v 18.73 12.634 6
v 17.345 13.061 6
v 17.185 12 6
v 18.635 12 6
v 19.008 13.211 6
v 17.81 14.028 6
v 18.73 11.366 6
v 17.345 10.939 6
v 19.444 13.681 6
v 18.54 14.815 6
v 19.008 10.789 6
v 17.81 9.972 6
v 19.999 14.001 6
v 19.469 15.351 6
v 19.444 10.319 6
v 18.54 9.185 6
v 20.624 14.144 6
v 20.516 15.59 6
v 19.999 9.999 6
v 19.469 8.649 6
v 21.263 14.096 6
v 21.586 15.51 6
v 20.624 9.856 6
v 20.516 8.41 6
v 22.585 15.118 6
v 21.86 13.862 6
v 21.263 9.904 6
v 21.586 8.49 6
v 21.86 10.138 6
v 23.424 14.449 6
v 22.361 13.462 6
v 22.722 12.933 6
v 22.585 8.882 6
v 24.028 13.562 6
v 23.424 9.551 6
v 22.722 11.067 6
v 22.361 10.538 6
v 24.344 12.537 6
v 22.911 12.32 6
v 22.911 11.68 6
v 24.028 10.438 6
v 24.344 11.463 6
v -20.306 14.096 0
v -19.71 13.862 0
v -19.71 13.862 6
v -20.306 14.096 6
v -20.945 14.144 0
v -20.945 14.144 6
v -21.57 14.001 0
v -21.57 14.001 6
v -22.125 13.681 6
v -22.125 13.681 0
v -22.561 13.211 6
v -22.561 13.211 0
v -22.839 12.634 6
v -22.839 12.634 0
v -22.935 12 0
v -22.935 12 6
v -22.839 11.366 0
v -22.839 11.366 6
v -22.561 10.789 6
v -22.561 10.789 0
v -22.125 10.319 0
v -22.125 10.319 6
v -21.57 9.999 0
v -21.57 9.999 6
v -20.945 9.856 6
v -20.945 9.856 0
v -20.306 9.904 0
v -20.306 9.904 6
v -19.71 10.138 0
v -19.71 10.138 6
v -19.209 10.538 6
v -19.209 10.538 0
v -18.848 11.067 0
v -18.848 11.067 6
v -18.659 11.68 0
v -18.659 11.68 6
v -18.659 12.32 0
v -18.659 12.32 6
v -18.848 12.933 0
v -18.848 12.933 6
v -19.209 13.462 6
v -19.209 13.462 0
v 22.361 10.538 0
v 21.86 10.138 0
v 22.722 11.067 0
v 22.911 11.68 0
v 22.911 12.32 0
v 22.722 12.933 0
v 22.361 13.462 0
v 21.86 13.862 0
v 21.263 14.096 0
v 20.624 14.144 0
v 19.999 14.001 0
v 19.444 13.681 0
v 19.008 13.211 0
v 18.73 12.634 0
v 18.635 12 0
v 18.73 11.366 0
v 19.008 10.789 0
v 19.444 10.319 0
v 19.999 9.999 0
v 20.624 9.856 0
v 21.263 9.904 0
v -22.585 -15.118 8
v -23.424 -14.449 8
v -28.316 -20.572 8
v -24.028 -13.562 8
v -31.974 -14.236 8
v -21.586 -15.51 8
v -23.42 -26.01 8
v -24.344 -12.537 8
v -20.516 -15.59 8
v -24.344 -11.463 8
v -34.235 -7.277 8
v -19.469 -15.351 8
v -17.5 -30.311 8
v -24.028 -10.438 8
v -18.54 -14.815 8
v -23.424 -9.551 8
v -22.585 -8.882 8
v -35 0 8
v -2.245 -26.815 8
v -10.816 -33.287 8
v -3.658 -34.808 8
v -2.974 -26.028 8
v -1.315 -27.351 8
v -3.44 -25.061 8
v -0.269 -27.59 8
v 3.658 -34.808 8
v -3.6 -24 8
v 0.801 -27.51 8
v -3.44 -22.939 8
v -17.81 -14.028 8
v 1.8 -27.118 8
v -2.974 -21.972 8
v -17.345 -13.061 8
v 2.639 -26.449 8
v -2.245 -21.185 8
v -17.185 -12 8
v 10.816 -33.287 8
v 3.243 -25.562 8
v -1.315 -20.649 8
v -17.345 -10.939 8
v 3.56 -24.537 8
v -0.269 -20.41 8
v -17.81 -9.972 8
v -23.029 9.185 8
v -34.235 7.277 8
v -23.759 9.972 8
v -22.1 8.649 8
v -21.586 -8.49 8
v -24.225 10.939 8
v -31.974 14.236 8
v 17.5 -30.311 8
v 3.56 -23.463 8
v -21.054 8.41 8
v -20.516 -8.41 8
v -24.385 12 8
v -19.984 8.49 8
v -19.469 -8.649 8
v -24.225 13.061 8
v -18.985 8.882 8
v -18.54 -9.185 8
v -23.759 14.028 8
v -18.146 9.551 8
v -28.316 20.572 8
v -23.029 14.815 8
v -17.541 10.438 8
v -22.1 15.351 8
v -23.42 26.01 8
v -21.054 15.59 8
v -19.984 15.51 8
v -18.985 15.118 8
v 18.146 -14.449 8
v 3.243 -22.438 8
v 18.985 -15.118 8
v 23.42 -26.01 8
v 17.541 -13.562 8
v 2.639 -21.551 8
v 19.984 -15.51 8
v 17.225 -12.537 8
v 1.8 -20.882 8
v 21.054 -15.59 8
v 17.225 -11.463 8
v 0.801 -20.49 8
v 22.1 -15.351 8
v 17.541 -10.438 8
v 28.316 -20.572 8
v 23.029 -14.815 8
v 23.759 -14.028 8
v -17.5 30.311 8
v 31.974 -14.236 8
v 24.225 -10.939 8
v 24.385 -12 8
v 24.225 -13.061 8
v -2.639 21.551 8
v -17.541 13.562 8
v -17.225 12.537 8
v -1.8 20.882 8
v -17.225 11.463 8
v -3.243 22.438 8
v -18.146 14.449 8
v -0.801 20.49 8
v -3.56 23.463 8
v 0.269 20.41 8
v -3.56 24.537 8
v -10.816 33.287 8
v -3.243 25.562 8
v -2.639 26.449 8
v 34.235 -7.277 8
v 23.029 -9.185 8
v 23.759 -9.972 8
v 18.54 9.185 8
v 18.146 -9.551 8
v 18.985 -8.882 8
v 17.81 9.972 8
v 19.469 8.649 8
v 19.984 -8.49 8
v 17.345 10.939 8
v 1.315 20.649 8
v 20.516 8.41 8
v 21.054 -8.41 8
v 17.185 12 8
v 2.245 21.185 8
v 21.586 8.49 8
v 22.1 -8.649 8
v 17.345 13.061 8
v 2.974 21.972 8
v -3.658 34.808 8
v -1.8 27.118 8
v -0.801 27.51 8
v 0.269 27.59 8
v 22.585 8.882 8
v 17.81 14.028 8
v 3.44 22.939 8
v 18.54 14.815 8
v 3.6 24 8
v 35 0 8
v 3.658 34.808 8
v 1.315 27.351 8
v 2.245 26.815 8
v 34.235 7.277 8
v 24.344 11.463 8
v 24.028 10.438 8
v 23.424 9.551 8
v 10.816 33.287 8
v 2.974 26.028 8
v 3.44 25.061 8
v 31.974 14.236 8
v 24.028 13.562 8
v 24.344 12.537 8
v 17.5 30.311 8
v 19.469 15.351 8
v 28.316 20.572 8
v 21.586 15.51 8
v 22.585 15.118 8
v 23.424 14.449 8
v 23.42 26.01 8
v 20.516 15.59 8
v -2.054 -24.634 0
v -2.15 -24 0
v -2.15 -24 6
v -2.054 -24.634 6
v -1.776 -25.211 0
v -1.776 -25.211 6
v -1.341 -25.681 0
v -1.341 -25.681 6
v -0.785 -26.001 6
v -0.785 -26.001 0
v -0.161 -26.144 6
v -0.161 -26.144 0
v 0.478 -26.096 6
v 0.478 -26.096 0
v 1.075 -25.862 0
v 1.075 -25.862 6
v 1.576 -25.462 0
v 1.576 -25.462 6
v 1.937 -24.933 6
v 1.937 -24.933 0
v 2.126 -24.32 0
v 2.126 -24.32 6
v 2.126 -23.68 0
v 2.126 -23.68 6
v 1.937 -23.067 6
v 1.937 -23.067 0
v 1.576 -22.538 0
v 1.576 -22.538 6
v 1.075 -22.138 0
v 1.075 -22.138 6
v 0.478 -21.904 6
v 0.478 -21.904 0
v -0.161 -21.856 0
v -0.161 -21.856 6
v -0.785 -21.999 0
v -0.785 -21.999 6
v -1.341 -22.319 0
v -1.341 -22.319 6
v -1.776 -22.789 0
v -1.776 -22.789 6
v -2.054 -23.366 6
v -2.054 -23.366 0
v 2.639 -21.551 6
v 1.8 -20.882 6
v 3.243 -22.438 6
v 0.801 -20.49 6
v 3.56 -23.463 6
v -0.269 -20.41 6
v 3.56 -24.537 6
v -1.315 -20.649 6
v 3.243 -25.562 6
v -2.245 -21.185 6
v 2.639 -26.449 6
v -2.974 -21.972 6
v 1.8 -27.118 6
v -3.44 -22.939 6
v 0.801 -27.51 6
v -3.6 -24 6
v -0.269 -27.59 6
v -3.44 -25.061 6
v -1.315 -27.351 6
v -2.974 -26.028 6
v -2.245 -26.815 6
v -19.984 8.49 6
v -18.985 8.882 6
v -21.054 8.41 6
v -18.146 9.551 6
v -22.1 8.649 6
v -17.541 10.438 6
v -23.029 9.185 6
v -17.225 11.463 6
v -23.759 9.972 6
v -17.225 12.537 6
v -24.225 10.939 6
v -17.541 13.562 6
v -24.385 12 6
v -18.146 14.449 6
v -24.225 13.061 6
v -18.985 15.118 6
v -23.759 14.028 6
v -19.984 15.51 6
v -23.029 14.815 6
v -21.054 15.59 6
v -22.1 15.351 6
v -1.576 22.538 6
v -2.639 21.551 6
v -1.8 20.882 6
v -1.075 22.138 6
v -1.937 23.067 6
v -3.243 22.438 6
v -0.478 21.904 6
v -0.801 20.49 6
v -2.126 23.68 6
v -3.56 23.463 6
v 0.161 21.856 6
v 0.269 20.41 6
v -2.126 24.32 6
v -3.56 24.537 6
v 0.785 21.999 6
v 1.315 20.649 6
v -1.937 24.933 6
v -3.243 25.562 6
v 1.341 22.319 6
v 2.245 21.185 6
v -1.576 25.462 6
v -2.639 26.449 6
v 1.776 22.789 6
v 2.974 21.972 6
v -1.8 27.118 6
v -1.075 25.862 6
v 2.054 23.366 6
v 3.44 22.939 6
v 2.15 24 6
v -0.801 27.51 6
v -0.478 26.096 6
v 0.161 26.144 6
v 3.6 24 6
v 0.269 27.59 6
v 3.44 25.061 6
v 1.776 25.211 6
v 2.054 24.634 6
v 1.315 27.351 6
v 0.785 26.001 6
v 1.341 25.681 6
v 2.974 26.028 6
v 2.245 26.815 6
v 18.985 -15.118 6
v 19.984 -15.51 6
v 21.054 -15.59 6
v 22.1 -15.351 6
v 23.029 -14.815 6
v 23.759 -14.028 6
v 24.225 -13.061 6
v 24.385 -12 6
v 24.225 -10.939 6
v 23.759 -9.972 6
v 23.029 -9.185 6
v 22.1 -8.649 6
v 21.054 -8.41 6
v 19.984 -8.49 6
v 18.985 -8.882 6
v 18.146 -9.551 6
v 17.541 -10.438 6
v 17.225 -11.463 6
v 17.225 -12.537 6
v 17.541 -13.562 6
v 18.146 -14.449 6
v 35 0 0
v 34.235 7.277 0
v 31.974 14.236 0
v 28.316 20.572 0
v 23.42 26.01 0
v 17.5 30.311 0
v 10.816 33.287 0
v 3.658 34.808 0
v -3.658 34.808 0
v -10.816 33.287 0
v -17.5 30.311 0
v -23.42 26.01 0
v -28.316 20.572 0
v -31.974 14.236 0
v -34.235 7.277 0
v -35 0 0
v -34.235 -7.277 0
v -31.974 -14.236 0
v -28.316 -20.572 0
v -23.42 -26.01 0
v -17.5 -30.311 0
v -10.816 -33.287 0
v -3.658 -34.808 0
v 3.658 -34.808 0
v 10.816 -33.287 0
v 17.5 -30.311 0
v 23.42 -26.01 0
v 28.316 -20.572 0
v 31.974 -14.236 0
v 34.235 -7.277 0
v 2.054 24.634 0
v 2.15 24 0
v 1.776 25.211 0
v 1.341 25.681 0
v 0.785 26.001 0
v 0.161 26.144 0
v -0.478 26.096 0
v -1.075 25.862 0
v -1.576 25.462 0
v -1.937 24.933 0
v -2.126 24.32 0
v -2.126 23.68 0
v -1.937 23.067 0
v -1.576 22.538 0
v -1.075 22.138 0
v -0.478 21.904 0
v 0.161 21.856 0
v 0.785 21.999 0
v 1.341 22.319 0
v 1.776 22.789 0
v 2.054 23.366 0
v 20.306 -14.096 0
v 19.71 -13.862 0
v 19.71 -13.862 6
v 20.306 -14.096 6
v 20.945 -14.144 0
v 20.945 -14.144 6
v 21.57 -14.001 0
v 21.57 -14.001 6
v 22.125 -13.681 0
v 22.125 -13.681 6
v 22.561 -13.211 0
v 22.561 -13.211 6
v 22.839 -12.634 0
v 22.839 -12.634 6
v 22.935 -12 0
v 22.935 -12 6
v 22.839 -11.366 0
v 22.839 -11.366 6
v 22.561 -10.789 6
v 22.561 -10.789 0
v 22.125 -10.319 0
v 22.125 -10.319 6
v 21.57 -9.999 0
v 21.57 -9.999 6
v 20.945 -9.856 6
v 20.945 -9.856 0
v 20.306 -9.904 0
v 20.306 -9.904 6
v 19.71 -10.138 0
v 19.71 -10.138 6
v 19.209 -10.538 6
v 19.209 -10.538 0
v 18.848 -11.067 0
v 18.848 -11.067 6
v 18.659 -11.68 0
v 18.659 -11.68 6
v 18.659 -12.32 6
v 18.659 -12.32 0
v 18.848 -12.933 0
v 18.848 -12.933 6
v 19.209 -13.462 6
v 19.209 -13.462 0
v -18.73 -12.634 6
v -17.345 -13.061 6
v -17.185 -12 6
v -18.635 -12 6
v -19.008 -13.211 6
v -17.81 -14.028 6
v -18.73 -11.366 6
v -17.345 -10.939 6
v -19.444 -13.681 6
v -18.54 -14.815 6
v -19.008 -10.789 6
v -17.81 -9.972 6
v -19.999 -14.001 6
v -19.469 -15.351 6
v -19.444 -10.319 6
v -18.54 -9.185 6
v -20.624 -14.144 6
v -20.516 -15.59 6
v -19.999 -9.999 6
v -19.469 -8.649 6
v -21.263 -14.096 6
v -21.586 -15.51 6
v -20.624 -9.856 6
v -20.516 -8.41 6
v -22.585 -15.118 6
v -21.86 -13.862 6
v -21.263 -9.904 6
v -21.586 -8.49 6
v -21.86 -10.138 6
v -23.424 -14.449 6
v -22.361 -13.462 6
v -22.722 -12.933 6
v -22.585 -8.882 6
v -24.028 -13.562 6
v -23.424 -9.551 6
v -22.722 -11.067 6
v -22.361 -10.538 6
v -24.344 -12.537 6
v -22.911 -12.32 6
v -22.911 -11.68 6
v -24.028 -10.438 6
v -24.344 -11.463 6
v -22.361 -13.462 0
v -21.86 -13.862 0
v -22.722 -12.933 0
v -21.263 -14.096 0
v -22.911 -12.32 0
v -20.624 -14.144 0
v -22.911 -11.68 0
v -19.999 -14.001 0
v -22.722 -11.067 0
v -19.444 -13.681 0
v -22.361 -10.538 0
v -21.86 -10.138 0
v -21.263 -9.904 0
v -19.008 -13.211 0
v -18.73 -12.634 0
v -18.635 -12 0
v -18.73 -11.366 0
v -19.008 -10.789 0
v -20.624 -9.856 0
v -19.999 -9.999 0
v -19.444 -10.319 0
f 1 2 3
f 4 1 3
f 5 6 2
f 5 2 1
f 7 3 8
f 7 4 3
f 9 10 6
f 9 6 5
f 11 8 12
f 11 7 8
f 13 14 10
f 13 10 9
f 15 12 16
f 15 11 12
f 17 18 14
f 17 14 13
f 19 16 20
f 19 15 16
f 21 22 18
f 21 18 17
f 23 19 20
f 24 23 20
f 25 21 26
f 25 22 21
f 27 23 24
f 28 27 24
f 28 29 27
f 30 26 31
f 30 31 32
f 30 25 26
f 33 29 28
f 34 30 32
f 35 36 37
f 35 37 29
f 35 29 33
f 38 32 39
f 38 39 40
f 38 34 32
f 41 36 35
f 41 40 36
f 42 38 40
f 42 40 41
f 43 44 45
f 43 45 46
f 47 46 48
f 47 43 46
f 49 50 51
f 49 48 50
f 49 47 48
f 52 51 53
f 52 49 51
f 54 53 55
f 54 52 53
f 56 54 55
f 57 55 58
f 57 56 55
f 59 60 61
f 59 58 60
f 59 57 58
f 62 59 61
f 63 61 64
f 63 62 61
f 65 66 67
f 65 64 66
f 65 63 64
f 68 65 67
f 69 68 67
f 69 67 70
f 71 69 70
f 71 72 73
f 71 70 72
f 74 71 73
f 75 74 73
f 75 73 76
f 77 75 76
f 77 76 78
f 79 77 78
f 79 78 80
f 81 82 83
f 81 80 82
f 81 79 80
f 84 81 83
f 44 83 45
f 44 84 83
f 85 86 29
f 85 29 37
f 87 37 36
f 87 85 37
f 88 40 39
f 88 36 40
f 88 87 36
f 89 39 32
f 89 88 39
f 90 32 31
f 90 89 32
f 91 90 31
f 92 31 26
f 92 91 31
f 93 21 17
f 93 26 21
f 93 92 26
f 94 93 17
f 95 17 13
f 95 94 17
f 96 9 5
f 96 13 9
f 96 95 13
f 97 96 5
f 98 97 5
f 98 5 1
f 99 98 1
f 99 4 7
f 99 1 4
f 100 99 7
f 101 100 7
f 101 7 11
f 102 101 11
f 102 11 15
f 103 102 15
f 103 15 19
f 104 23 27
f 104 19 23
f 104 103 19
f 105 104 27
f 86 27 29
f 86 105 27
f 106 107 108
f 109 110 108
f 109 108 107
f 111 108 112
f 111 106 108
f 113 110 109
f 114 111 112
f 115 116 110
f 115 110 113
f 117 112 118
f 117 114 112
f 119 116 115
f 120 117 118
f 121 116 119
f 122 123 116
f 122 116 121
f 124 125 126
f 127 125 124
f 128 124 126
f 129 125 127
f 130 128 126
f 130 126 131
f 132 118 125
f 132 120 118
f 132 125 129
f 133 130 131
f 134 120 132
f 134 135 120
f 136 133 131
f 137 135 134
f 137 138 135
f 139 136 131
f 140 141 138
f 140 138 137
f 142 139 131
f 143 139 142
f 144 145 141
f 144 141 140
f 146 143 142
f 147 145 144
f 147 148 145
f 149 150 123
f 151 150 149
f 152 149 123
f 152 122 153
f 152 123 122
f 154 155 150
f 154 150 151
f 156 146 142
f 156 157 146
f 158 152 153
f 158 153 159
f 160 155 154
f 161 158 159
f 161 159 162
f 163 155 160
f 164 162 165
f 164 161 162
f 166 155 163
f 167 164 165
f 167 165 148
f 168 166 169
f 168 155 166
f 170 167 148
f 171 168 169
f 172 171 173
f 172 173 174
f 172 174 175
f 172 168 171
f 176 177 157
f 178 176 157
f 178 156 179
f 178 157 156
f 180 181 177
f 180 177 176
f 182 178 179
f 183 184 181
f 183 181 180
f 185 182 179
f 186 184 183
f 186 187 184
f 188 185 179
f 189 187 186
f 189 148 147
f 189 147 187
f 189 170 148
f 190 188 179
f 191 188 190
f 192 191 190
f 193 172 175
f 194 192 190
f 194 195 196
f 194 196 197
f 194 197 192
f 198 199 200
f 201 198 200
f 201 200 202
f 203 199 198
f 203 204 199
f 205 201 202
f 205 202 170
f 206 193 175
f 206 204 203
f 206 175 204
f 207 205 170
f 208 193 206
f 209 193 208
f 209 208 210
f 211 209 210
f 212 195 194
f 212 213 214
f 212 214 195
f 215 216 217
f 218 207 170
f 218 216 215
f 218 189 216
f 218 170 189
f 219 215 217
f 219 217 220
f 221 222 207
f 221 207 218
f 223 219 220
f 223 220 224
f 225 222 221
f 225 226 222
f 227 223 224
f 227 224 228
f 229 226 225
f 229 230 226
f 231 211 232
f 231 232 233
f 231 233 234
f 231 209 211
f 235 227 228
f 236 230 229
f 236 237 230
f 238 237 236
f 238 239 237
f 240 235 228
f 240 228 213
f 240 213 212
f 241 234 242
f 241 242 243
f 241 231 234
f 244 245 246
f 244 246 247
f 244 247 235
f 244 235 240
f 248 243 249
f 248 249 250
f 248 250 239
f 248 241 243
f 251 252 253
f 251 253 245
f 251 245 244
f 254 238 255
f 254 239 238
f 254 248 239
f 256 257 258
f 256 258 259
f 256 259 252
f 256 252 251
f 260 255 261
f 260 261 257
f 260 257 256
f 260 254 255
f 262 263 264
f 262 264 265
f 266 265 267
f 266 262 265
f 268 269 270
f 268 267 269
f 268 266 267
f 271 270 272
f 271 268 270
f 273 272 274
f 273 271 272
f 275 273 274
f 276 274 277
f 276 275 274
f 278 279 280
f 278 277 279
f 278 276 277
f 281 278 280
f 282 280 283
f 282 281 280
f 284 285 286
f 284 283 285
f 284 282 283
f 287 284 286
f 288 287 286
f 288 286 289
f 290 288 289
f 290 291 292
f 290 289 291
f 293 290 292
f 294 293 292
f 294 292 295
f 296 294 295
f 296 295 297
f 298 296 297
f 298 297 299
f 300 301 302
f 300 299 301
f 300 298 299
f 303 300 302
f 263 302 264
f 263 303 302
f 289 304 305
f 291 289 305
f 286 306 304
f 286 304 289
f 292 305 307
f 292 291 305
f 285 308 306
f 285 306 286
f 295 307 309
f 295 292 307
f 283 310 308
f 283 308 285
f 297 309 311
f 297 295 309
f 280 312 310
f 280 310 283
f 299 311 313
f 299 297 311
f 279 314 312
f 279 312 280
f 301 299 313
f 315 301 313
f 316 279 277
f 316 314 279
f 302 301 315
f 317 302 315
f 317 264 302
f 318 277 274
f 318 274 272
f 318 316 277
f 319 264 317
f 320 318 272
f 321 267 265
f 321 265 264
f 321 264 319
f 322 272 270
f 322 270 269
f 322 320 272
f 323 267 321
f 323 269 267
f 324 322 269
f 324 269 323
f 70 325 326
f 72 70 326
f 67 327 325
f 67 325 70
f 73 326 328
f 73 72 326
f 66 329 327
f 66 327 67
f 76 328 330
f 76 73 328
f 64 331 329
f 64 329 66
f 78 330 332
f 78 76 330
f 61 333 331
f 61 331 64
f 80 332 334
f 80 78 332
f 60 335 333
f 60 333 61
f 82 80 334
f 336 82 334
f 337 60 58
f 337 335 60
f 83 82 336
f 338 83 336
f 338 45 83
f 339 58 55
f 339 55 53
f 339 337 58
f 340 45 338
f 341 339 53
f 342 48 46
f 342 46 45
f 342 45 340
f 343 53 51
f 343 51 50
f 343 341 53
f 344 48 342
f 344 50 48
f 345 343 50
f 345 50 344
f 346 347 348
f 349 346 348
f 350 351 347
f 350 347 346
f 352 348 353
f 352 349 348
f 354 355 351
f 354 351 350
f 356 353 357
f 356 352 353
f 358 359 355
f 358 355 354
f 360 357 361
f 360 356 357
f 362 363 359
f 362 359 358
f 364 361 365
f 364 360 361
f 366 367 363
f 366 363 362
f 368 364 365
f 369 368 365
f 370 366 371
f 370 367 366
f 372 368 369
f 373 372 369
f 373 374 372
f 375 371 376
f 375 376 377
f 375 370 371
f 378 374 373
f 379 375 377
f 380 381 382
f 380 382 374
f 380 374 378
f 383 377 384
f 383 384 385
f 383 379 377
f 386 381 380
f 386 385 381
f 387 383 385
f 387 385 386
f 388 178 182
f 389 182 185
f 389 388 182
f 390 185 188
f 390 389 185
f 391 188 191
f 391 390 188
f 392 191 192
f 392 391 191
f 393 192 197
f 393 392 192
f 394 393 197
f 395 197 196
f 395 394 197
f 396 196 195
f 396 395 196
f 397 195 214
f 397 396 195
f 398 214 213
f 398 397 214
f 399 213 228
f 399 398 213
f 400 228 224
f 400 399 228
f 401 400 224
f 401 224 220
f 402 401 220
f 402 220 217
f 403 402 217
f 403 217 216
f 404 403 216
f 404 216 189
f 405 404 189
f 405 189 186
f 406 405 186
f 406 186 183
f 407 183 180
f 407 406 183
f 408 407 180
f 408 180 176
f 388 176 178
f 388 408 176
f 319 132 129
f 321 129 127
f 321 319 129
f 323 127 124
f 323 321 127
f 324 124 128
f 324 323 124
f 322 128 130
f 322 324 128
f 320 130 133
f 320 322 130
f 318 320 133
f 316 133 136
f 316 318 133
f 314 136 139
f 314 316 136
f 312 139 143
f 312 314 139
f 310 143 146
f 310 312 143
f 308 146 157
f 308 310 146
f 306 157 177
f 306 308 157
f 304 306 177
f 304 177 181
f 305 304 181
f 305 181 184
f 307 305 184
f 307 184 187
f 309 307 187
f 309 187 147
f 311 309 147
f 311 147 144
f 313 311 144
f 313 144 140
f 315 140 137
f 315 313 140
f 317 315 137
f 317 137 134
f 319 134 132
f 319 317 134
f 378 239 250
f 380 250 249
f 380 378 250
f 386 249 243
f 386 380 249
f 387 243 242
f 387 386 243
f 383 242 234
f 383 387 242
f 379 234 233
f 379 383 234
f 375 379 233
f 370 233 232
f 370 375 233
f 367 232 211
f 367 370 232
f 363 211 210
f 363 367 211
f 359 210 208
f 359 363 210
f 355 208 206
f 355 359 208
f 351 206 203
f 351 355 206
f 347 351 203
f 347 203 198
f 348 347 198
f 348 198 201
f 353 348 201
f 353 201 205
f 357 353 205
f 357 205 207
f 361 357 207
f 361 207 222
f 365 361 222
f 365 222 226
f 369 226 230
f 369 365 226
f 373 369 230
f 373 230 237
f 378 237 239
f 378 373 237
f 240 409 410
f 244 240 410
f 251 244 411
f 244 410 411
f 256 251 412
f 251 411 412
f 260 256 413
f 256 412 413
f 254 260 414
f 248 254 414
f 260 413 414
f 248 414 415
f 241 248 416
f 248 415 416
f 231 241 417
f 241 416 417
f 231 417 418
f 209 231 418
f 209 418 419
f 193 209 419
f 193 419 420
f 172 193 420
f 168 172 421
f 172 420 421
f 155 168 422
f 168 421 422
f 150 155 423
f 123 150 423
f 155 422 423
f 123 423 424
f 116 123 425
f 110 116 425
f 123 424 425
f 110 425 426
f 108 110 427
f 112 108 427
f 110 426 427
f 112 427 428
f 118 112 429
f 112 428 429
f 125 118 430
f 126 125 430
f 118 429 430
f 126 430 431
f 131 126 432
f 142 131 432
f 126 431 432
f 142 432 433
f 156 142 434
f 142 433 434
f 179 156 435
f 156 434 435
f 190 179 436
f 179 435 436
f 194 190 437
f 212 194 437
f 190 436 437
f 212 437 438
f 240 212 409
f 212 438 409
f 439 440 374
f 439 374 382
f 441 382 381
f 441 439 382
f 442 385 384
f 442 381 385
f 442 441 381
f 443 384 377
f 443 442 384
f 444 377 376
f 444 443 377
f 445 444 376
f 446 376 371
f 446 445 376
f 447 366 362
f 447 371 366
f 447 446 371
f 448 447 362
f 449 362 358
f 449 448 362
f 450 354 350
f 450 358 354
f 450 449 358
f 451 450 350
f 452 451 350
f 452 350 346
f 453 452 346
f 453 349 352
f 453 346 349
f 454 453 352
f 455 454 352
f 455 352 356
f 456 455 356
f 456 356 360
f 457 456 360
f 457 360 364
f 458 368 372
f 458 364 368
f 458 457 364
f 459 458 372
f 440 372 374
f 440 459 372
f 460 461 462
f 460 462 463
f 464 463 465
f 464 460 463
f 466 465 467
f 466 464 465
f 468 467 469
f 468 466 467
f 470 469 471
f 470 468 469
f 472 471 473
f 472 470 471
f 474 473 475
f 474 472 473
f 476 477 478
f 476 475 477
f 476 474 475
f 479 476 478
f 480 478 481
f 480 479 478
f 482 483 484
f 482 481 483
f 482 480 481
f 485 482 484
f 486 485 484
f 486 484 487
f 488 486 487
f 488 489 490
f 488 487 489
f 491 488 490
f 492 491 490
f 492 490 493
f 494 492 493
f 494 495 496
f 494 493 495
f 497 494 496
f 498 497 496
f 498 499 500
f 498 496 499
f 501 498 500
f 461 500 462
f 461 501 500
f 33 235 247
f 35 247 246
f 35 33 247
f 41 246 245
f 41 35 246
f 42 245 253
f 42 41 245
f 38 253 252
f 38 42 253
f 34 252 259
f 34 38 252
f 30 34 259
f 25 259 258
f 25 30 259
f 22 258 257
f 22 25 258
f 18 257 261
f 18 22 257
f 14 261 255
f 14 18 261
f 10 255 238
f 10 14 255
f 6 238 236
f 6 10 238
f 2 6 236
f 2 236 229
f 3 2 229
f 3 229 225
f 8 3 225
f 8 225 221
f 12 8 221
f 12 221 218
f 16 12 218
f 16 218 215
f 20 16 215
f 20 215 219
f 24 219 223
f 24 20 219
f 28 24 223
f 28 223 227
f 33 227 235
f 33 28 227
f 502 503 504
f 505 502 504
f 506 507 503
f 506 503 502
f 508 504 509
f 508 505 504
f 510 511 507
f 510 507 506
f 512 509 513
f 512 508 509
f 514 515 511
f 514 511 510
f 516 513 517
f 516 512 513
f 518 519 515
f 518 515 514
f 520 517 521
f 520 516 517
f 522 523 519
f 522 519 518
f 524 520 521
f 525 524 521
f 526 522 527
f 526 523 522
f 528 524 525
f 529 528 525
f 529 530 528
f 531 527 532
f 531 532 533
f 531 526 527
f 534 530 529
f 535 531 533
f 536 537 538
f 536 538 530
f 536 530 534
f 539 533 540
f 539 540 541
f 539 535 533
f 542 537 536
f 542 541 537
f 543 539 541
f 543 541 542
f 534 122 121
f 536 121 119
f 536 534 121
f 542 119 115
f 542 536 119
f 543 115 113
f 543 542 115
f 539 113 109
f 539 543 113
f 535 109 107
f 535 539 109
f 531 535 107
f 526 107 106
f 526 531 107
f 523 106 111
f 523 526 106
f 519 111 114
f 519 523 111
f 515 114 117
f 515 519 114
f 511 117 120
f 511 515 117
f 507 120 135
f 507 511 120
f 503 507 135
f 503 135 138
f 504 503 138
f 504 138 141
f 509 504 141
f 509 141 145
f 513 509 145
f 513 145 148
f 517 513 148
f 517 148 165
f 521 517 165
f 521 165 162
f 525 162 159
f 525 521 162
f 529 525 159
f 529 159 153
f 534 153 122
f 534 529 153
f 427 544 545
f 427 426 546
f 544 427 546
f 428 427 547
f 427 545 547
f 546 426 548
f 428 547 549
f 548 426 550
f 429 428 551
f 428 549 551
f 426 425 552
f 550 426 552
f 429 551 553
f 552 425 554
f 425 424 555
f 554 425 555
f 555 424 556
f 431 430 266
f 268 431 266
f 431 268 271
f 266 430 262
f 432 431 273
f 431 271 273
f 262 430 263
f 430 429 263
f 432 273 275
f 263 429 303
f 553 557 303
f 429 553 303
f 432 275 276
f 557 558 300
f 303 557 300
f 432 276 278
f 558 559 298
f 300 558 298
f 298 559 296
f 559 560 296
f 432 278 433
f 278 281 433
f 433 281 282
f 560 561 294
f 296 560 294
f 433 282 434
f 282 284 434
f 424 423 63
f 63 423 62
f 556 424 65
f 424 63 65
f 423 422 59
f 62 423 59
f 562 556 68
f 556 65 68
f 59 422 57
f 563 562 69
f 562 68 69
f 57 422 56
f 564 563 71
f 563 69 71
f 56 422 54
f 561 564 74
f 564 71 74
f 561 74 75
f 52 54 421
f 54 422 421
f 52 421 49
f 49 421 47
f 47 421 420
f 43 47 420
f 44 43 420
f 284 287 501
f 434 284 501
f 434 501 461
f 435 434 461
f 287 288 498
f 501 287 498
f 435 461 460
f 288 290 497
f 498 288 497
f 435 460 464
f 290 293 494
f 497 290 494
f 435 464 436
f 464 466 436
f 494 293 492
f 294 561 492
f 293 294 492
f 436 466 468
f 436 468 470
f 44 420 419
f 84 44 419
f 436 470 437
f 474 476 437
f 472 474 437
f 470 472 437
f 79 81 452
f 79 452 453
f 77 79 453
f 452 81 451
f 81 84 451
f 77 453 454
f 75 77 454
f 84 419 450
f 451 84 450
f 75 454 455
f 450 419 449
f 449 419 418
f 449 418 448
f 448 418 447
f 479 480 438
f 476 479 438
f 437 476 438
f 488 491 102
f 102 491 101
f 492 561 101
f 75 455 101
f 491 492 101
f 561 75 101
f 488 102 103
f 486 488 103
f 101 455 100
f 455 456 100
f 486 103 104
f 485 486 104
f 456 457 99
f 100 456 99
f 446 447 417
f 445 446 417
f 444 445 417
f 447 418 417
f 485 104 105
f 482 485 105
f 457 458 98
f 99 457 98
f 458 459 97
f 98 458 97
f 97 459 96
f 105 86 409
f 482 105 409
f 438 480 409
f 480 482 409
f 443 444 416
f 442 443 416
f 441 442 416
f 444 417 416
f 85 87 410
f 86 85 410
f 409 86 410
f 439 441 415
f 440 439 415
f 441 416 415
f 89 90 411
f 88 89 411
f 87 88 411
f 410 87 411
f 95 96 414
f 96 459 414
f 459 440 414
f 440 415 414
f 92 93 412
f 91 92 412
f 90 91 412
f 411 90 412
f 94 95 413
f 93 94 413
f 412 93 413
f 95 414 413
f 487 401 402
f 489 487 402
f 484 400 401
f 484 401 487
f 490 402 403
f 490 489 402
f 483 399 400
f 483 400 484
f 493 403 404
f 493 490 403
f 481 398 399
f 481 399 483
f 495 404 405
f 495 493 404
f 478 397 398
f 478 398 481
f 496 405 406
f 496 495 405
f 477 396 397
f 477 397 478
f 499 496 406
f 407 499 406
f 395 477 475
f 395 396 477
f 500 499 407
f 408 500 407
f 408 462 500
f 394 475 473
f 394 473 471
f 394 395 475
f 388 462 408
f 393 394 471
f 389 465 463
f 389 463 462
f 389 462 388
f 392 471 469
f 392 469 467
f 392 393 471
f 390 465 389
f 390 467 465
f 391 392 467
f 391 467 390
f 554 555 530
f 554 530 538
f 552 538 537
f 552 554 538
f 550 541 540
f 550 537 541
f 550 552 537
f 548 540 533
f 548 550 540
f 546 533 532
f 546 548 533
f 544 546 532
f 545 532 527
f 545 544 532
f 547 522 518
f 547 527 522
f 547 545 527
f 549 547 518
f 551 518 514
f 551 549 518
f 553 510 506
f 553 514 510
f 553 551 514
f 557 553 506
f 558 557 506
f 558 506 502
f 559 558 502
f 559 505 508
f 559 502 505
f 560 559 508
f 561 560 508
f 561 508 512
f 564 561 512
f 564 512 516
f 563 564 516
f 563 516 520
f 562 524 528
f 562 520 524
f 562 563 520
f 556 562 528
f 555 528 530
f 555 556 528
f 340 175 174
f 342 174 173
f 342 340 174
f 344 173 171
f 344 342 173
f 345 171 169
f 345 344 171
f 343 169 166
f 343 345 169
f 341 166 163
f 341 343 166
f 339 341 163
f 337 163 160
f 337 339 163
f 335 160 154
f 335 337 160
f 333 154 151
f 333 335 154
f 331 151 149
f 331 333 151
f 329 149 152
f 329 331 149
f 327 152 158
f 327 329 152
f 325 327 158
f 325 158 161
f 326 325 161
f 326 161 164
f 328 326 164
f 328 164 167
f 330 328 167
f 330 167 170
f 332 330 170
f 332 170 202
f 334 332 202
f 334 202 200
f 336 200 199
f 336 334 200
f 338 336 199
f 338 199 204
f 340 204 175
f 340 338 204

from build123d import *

# Parameters (mm, degrees)
CYLINDER014005857_R             = 2.15
CYLINDER014005857_DEPTH         = 16
CYLINDER014005858_R             = 3.6
CYLINDER014005858_DEPTH         = 4
FUSION001089095_PLACEMENT_ANGLE = 60
FUSION001089096_PLACEMENT_ANGLE = 120
FUSION001089097_PLACEMENT_ANGLE = 180
FUSION001089098_PLACEMENT_ANGLE = 240
FUSION001089099_PLACEMENT_ANGLE = 60
CYLINDER014005856_R             = 35
CYLINDER014005856_DEPTH         = 8


with BuildPart() as v_lec769:
    # Cylinder014005857 → Cylinder014005857 (new body)
    with BuildSketch(Plane(origin=(0, 24, -6), x_dir=(1, 0, 0), z_dir=(0, 0, 1))):
        Circle(CYLINDER014005857_R)
    extrude(amount=CYLINDER014005857_DEPTH)


with BuildPart() as imbus006:
    # Cylinder014005858 → Cylinder014005858 (new body)
    with BuildSketch(Plane(origin=(0, 24, 6), x_dir=(1, 0, 0), z_dir=(0, 0, 1))):
        Circle(CYLINDER014005858_R)
    extrude(amount=CYLINDER014005858_DEPTH)

    # Fusion001089094: union Válec769
    add(v_lec769.part)


with BuildPart() as imbus007:
    # Fusion001089095 base: copy of Imbus006
    add(imbus006.part)


with BuildPart() as imbus007_1:
    # Fusion001089095 placement: moved
    add(imbus007.part.rotate(Axis((0, 0, 0), (0, 0, 1)), FUSION001089095_PLACEMENT_ANGLE))


with BuildPart() as imbus008:
    # Fusion001089096 base: copy of Imbus006
    add(imbus006.part)


with BuildPart() as imbus008_1:
    # Fusion001089096 placement: moved
    add(imbus008.part.rotate(Axis((0, 0, 0), (0, 0, 1)), FUSION001089096_PLACEMENT_ANGLE))


with BuildPart() as imbus009:
    # Fusion001089097 base: copy of Imbus006
    add(imbus006.part)


with BuildPart() as imbus009_1:
    # Fusion001089097 placement: moved
    add(imbus009.part.rotate(Axis((0, 0, 0), (0, 0, 1)), FUSION001089097_PLACEMENT_ANGLE))


with BuildPart() as imbus010:
    # Fusion001089098 base: copy of Imbus006
    add(imbus006.part)


with BuildPart() as imbus010_1:
    # Fusion001089098 placement: moved
    add(imbus010.part.rotate(Axis((0, 0, 0), (0, 0, 1)), FUSION001089098_PLACEMENT_ANGLE))


with BuildPart() as imbus011:
    # Fusion001089099 base: copy of Imbus006
    add(imbus006.part)


with BuildPart() as imbus011_1:
    # Fusion001089099 placement: moved
    add(imbus011.part.rotate(Axis((0, 0, 0), (0, 0, -1)), FUSION001089099_PLACEMENT_ANGLE))


with BuildPart() as fusion001089100:
    # Fusion001089100 base: copy of Imbus006
    add(imbus006.part)

    # Fusion001089100: union Imbus007, Imbus008, Imbus009, Imbus010, Imbus011
    add(imbus007_1.part)
    add(imbus008_1.part)
    add(imbus009_1.part)
    add(imbus010_1.part)
    add(imbus011_1.part)


with BuildPart() as old:
    # Cylinder014005856 → Cylinder014005856 (new body)
    with BuildSketch(Plane.XY):
        Circle(CYLINDER014005856_R)
    extrude(amount=CYLINDER014005856_DEPTH)

    # Cut009003003008: cut Fusion001089100
    add(fusion001089100.part, mode=Mode.SUBTRACT)


solid = old.part
